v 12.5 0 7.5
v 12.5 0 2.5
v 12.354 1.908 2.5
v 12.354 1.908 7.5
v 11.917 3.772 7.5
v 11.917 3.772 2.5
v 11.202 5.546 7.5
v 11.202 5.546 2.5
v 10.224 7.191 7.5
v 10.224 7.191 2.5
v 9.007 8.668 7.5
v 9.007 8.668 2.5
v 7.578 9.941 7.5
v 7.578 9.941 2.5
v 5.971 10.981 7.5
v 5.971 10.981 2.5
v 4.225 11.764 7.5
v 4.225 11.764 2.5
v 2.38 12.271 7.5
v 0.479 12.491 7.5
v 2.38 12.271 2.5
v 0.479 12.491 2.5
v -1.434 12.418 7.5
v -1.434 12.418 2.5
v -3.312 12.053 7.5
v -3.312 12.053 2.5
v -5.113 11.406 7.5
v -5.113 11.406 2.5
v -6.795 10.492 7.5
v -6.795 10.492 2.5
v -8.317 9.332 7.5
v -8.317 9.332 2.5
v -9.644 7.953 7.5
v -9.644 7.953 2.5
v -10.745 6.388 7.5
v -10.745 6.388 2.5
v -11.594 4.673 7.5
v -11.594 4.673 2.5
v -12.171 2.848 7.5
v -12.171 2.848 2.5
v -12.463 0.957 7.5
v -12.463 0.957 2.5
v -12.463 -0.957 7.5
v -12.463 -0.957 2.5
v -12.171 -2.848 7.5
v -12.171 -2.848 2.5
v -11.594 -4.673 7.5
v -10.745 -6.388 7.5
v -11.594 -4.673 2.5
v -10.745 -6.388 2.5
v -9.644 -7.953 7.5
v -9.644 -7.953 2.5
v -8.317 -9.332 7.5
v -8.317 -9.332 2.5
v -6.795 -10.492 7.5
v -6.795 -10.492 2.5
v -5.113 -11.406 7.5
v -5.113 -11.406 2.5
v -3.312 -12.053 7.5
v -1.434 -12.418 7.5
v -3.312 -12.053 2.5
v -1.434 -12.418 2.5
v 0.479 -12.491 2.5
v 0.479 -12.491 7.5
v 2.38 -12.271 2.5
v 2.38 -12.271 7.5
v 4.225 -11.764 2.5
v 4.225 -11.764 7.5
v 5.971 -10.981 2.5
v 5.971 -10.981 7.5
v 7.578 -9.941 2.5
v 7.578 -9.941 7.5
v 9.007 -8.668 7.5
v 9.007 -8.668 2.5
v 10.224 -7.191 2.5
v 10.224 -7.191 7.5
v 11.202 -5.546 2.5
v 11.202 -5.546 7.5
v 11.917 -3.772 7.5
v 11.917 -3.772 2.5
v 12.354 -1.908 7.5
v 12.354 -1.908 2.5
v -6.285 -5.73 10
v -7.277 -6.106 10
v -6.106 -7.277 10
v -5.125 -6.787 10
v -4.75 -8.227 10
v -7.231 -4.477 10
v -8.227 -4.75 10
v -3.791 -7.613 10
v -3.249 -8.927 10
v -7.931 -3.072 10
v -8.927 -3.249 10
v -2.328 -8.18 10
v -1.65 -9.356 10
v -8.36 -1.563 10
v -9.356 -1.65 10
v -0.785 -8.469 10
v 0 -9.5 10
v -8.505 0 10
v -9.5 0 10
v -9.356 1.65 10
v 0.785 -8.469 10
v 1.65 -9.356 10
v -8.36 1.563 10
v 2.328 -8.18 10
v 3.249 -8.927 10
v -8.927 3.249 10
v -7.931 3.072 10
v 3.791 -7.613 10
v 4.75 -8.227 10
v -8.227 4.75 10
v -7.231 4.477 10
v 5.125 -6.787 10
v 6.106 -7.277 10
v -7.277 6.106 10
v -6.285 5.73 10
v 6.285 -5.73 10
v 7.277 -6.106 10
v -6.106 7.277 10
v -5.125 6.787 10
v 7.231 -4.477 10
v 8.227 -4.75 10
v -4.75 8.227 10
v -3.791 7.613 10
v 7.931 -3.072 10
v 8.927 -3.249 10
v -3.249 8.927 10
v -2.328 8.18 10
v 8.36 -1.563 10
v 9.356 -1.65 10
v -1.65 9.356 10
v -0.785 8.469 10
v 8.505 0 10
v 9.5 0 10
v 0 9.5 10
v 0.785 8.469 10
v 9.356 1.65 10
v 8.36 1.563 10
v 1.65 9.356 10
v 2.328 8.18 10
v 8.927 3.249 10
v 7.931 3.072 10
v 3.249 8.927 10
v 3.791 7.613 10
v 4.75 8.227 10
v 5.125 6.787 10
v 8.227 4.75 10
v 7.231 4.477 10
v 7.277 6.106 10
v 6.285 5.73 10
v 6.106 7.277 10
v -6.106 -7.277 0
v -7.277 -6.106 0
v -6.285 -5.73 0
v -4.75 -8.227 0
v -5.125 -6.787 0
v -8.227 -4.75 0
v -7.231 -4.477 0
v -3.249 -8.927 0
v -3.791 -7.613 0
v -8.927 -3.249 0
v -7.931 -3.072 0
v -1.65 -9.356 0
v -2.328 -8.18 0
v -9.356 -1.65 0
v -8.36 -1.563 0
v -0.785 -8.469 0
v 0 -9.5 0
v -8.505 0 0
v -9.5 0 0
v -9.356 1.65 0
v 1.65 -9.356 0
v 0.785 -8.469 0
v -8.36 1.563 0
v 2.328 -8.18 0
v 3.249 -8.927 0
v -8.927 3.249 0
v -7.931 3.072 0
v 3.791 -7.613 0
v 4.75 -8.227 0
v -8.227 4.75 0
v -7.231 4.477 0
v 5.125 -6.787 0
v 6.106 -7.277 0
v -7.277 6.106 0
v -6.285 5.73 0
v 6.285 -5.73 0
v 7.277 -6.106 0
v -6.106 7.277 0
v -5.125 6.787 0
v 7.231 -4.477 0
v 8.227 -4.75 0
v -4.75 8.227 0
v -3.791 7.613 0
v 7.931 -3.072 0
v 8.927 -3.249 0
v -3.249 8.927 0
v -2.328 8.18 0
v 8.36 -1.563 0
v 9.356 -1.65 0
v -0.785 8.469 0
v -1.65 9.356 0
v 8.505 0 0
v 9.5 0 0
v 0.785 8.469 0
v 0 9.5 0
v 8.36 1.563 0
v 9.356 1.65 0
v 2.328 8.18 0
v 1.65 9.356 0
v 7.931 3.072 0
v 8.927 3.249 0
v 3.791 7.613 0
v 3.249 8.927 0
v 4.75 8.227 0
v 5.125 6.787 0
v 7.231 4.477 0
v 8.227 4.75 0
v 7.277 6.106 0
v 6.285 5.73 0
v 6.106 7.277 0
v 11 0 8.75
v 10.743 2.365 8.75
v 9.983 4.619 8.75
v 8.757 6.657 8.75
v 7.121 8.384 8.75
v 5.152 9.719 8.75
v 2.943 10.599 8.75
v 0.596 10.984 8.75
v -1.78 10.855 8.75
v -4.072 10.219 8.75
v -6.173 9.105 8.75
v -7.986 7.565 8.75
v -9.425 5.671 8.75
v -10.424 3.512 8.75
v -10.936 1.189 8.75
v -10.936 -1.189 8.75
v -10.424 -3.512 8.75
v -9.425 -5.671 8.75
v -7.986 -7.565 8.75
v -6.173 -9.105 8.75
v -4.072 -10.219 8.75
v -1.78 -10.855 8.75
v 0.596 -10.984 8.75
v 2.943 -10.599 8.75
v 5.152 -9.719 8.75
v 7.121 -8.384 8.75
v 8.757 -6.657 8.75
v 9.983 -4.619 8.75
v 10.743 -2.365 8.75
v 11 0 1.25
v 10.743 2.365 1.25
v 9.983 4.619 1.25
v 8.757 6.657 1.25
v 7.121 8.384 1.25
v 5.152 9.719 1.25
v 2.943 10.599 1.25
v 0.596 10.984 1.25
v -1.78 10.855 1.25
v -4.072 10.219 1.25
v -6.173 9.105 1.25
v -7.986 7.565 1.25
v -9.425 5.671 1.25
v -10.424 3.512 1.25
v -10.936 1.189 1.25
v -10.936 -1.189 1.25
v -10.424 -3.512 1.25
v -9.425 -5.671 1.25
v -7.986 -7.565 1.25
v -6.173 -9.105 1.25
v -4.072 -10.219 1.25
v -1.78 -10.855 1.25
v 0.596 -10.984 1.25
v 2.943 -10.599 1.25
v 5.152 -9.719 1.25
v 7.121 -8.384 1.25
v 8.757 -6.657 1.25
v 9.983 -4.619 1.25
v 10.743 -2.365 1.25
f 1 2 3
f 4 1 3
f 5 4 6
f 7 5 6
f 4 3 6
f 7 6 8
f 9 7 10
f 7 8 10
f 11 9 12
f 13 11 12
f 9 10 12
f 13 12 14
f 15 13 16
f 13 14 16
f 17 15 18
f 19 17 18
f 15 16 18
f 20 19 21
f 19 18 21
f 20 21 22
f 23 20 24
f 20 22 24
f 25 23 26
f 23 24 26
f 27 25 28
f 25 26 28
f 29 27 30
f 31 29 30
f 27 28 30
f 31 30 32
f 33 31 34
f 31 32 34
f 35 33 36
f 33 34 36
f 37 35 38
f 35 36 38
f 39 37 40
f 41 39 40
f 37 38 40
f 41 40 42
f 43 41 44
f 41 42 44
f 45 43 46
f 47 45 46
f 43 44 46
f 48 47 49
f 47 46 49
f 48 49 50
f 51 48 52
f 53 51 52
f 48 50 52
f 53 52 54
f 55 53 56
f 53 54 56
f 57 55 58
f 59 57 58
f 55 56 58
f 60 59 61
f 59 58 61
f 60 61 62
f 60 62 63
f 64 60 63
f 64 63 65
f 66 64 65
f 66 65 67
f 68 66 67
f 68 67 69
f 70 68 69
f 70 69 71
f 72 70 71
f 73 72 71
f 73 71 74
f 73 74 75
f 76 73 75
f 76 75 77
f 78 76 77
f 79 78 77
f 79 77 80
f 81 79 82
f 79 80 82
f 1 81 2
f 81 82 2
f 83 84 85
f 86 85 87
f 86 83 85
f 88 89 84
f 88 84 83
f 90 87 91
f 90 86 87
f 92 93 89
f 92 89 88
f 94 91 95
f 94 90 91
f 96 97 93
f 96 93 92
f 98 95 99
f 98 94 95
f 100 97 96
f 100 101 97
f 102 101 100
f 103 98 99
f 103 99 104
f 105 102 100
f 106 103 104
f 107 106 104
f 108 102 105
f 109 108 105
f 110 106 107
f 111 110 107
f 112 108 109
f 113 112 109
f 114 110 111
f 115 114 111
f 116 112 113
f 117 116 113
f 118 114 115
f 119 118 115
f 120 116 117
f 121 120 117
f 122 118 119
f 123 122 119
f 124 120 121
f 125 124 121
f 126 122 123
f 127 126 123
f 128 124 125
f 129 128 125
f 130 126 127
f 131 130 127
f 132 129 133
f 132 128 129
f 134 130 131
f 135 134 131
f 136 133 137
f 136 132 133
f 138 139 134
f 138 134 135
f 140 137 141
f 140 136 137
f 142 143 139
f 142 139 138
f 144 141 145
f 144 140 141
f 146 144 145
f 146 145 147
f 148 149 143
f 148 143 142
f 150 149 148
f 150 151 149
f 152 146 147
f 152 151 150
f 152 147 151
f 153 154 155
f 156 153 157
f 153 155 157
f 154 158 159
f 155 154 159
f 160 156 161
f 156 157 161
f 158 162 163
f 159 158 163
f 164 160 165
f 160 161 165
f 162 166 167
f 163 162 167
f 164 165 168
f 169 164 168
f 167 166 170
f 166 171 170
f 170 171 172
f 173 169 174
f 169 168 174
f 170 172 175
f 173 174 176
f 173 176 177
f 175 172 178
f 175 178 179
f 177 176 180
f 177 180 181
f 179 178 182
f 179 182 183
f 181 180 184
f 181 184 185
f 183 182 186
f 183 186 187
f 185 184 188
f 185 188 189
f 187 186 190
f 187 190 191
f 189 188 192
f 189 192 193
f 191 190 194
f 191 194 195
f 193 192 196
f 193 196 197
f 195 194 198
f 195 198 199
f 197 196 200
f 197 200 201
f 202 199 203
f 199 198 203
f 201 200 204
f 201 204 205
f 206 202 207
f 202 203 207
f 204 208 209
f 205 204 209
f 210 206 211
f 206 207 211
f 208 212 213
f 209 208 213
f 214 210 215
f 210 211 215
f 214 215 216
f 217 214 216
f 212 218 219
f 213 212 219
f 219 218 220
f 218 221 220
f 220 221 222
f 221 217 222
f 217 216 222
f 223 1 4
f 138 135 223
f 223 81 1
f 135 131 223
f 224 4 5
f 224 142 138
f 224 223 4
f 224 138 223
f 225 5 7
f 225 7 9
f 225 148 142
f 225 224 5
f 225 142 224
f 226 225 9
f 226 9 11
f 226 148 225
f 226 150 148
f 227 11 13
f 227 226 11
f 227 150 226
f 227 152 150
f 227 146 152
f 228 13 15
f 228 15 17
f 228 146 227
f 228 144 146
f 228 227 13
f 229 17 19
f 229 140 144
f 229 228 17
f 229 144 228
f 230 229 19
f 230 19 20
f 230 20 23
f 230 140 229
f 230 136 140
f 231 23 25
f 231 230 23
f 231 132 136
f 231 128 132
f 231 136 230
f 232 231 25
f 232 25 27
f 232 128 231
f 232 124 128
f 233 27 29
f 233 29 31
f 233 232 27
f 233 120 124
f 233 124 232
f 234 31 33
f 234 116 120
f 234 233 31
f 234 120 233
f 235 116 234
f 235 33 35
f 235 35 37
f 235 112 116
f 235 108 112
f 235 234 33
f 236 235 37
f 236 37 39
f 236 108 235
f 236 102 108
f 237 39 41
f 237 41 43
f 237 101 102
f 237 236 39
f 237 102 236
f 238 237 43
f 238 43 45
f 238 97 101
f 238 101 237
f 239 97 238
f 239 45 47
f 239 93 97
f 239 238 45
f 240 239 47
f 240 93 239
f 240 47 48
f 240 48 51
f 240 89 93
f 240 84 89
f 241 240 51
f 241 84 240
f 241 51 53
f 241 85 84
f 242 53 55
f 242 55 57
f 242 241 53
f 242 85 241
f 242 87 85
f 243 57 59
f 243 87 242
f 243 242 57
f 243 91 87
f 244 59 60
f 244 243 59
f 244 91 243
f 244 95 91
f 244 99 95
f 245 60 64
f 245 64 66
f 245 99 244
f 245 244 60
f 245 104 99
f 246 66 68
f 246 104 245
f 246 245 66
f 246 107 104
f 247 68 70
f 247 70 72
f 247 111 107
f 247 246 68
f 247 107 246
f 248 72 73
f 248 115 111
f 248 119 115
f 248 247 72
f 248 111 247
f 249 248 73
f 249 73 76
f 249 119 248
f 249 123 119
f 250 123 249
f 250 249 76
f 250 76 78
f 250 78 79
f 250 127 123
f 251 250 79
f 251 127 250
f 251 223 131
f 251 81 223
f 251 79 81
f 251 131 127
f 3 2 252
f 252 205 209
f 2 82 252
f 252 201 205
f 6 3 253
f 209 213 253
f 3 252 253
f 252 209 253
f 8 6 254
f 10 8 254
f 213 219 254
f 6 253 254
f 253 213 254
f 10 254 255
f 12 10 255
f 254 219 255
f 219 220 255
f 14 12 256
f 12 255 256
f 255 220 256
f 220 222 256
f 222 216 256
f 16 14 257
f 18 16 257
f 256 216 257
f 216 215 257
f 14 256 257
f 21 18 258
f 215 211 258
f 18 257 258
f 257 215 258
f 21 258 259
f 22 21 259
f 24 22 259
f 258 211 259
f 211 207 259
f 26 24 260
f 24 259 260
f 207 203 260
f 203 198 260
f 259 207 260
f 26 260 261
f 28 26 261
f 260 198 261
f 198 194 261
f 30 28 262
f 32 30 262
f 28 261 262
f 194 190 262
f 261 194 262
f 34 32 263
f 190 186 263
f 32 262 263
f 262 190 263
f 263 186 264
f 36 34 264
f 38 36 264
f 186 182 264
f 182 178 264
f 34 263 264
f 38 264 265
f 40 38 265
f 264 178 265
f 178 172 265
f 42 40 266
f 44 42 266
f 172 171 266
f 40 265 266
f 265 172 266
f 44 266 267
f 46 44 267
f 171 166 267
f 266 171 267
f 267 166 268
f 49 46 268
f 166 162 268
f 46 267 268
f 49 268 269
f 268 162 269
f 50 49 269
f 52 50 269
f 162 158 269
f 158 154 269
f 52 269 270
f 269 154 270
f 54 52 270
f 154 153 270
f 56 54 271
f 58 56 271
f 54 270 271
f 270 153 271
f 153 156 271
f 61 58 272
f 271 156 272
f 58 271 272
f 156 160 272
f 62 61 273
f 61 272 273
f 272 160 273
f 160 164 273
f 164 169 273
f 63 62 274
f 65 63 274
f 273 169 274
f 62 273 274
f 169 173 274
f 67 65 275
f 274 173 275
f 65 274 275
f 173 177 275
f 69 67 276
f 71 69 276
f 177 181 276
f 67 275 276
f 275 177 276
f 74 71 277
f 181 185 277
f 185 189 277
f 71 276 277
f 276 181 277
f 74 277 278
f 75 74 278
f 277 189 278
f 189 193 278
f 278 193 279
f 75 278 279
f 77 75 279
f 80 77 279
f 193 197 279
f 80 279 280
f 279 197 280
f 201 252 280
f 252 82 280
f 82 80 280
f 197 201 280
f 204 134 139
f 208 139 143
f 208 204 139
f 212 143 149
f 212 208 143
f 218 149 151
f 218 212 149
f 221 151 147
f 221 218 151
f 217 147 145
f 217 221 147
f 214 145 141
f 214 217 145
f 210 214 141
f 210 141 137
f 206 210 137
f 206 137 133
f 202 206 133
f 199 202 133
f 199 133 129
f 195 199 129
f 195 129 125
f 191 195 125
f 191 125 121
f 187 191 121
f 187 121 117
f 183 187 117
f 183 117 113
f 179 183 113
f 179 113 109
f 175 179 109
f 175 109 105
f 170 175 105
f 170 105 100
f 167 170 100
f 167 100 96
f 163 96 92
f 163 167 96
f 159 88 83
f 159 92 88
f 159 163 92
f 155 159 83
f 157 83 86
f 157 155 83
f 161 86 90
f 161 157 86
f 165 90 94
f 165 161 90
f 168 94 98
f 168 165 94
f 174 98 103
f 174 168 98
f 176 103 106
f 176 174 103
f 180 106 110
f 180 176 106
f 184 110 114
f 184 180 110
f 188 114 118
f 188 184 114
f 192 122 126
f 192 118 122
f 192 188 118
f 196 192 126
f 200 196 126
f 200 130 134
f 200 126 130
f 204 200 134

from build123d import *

# Parameters (mm, degrees)
F0_R     = 12.5
F1_DEPTH = 10
F2_R     = 8.505
F3_DEPTH = 27.2
F4_SIZE2 = 3
F4_SIZE  = 2.5


with BuildPart() as f1:
    # F0 (on Top) → F1 (new body)
    with BuildSketch(Plane.XY):
        Circle(F0_R)
    extrude(amount=F1_DEPTH)

    # F2 (on Top) → F3 (cut)
    with BuildSketch(Plane.XY):
        Circle(F2_R)
    extrude(amount=F3_DEPTH, mode=Mode.SUBTRACT)

    # F4
    f4_edges = [f1.edges().sort_by_distance(p)[0] for p in [
        (12.5, 0, 5),
        (-12.5, 0, 0),
        (-12.5, 0, 10),
    ]]
    chamfer(f4_edges, length=F4_SIZE, length2=F4_SIZE2)


solid = f1.part
